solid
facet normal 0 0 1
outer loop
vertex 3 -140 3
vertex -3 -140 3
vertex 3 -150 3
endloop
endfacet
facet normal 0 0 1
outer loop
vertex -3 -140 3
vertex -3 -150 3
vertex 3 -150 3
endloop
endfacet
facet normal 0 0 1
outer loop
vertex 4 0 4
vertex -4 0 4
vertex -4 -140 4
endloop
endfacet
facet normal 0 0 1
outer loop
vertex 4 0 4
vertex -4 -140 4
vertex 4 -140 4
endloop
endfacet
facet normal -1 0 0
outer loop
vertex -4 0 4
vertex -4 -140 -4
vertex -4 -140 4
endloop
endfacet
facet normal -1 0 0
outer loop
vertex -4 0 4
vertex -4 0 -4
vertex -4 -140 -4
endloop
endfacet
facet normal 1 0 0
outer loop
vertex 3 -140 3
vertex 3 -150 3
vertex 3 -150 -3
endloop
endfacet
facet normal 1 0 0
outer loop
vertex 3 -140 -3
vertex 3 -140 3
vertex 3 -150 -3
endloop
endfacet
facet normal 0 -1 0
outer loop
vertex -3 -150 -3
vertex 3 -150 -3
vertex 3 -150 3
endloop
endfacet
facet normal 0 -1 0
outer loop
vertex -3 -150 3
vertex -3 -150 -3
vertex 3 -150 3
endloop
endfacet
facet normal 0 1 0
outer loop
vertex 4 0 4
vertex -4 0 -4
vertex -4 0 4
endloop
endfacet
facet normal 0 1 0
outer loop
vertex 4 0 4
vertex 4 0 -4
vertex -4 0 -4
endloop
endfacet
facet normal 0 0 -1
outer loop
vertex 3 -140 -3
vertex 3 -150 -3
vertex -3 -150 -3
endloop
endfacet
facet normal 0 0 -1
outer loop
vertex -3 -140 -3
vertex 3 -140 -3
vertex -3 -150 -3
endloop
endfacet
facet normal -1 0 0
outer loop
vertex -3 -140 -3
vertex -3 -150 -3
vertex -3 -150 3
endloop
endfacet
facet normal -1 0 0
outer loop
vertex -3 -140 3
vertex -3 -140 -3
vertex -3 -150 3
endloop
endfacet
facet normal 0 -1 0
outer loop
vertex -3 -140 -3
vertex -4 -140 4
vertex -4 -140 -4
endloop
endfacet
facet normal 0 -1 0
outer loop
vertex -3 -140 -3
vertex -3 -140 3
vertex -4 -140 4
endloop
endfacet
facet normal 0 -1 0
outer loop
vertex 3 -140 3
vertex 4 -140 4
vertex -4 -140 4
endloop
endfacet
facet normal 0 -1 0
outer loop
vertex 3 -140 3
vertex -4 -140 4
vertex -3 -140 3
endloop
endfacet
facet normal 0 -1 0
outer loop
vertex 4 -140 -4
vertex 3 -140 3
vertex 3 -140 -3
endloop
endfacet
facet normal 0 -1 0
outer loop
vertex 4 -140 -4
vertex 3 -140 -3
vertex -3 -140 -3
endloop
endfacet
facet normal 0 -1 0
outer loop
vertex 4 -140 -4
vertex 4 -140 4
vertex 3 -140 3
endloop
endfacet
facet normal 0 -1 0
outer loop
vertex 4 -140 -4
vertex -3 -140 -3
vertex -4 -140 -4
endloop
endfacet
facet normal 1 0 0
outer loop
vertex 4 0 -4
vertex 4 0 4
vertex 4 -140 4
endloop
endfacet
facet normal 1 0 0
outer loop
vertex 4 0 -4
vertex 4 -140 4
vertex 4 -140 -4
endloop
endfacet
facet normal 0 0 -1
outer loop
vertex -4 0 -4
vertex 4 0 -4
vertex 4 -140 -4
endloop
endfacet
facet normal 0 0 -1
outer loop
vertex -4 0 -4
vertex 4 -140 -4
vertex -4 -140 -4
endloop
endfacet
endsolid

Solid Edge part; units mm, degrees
sketch "Sketch1" plane through (0, 0, 0) normal (0, -1, 0) x (1, 0, 0)
  line L0 (-4, 4) -> (4, 4)
  line L1 (4, 4) -> (4, -4)
  line L2 (4, -4) -> (-4, -4)
  line L3 (-4, -4) -> (-4, 4)
  dimension "D1" = 8
  dimension "D2" = 8
extrude "Protrusion1" add sketch "Sketch1" along normal blind 150
sketch "Sketch2" plane through (0, -150, 0) normal (0, -1, 0) x (1, 0, 0)
  line L0 (-3, 3) -> (3, 3)
  line L1 (3, 3) -> (3, -3)
  line L2 (3, -3) -> (-3, -3)
  line L3 (-3, -3) -> (-3, 3)
  line L4 (-4, -4) -> (4, -4)
  line L5 (4, -4) -> (4, 4)
  line L6 (4, 4) -> (-4, 4)
  line L7 (-4, 4) -> (-4, -4)
  dimension "D1" = 6
extrude "Extrusionsausschnitt_1" cut sketch "Sketch2" against normal blind 10
